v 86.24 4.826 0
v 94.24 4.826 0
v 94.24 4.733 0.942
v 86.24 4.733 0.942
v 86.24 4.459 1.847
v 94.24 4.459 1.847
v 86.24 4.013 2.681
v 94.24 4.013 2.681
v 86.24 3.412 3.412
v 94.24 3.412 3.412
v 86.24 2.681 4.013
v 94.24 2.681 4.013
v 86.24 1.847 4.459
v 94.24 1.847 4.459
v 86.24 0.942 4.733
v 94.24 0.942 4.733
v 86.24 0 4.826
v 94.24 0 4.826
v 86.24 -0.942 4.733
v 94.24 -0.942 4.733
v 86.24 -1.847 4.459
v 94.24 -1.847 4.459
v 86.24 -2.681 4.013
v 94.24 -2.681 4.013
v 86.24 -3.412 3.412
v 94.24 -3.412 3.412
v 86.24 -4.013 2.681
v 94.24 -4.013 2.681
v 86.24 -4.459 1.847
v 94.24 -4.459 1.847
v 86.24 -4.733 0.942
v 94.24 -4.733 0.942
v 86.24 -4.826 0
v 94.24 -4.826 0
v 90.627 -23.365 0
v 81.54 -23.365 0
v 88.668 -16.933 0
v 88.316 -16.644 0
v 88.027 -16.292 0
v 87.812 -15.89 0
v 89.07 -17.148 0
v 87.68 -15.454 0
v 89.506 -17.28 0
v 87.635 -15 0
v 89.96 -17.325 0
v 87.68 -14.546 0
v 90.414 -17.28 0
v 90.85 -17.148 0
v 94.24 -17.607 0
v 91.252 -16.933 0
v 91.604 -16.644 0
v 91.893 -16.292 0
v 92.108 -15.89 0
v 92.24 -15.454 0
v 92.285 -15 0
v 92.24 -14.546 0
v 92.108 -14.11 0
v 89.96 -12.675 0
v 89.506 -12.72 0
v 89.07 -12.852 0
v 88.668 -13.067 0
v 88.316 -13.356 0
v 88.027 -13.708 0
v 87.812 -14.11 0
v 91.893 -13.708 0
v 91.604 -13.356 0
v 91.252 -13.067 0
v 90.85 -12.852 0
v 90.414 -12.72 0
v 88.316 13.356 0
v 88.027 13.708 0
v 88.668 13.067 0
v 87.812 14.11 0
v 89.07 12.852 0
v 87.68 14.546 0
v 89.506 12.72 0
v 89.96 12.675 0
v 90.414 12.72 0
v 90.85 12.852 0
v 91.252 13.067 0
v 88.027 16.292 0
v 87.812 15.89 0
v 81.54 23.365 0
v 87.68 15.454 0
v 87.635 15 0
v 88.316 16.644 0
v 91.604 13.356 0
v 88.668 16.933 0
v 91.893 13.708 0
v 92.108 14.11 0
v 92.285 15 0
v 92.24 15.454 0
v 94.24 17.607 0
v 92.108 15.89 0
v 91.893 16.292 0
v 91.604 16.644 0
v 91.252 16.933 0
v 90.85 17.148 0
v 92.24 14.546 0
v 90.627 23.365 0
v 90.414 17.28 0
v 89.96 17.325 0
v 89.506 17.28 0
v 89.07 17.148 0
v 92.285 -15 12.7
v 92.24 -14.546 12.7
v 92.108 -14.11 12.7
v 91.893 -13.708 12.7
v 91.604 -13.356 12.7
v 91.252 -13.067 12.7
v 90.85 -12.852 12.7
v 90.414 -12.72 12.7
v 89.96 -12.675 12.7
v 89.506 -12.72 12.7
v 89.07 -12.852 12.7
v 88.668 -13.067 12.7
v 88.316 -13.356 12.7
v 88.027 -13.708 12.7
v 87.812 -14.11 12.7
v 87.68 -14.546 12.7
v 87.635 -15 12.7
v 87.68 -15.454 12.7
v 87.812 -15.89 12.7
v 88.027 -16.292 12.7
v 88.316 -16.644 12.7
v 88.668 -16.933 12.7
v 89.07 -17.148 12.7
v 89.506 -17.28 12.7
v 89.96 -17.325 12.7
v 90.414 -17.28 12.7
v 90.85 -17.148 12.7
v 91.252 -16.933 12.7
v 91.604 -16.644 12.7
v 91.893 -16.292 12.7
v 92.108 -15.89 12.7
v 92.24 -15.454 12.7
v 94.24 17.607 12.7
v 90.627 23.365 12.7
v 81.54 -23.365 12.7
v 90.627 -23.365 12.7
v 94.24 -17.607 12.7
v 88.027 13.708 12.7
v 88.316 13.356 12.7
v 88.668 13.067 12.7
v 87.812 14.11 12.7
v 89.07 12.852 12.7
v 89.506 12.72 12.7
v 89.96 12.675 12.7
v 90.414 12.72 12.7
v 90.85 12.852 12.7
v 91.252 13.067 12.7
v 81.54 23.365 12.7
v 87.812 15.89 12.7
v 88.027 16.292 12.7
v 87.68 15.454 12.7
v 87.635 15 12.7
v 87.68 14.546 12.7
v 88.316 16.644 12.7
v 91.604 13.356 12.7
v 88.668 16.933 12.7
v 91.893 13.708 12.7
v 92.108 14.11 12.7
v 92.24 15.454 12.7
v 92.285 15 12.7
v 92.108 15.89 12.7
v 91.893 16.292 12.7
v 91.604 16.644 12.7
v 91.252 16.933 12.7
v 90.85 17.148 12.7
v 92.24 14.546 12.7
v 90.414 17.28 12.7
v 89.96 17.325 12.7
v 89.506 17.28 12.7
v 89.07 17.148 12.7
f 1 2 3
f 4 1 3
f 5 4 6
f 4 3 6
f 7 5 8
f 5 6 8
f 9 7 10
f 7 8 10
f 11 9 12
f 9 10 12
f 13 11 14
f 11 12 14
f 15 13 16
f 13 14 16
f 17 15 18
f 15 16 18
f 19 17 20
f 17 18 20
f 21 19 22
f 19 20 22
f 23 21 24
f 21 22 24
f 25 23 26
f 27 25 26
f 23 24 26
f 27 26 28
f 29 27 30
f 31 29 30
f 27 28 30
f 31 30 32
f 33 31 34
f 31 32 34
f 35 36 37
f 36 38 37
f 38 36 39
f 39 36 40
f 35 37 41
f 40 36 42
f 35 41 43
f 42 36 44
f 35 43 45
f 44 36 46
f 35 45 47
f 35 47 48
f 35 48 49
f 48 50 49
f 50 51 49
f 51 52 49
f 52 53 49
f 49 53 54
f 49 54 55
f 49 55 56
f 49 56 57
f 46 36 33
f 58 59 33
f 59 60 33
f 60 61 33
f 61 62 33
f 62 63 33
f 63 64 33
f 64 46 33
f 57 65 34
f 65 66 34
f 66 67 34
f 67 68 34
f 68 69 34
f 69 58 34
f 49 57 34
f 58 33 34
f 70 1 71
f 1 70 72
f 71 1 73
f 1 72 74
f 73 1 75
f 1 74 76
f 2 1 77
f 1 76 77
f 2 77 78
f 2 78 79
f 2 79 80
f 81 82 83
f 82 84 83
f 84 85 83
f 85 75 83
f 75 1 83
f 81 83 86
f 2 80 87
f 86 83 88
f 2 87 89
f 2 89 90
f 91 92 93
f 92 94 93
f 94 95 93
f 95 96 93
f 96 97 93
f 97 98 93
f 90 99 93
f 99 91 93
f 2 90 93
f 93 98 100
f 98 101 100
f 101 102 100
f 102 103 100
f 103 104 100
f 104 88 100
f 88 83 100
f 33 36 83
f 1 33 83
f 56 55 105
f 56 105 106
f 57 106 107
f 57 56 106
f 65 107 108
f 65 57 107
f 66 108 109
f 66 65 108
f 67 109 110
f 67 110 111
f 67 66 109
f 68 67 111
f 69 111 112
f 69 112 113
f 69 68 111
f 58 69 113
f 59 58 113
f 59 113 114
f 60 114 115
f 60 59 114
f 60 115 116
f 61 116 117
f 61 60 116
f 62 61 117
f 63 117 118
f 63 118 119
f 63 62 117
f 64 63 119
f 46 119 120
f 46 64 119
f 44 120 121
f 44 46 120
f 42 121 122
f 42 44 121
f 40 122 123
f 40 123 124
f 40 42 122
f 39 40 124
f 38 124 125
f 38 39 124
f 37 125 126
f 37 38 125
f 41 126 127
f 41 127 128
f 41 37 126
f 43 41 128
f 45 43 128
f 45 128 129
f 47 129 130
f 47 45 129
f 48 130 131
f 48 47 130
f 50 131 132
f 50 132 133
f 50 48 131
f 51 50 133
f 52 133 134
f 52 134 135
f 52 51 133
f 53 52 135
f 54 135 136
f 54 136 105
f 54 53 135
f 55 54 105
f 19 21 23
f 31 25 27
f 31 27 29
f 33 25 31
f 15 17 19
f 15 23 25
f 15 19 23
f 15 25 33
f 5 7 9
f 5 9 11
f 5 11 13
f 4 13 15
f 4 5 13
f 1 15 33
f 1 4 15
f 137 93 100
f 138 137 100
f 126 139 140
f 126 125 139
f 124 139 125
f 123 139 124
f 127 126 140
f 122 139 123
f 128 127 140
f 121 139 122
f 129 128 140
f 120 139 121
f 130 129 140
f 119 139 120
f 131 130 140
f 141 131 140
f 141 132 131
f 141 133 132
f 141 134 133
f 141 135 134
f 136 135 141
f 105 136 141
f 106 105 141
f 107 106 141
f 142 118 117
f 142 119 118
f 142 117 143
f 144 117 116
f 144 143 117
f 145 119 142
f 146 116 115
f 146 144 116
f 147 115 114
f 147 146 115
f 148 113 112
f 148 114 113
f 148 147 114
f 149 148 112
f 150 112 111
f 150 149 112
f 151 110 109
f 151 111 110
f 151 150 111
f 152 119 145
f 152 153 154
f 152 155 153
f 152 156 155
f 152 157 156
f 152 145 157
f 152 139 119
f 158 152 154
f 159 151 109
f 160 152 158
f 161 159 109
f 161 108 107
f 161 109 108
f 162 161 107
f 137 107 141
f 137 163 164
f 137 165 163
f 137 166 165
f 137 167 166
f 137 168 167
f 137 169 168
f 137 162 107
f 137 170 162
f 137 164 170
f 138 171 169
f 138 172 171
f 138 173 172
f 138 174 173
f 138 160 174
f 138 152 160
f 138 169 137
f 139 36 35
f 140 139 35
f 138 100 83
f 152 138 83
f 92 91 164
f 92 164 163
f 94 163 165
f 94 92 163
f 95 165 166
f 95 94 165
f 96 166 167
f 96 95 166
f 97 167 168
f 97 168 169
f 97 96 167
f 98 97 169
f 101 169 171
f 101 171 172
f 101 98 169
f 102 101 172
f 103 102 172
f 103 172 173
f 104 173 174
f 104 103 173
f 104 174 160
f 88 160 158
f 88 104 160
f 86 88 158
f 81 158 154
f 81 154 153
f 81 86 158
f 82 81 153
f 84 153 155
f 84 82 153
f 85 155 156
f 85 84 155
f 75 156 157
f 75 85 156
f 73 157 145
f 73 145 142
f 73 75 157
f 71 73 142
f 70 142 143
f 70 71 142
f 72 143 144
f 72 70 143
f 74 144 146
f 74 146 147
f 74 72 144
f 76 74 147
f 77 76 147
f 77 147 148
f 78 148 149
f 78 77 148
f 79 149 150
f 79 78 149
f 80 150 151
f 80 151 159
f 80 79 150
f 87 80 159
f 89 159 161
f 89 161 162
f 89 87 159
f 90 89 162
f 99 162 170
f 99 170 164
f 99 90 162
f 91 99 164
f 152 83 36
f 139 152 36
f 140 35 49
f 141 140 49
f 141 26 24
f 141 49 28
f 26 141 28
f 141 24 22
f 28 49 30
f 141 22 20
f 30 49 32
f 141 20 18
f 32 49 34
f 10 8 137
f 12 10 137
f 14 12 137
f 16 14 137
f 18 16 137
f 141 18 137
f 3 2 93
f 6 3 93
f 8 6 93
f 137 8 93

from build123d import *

# Parameters (mm, degrees)
SKETCH1_R           = 2.325
SKETCH1_W           = 7.749999992
SKETCH1_H           = 9.652
BOSS_EXTRUDE1_DEPTH = 12.7
SKETCH2_R           = 4.826
CUT_EXTRUDE1_DEPTH  = 8


with BuildPart() as part:
    # Sketch1 → Boss-Extrude1 (new body)
    # profile 1 of 2: a face of its own
    with BuildSketch(Plane.XY):
        Polygon((90.626647956, 23.365008212), (81.539999992, 23.365008212), (81.539999992, -23.365008212), (90.626647956, -23.365008212), (94.239999992, -17.607359271), (94.239999992, -4.826), (86.49, -4.826), (86.49, 4.826), (94.239999992, 4.826), (94.239999992, 17.607359271), align=None)
        with Locations((89.96, -15)):
            Circle(SKETCH1_R, mode=Mode.SUBTRACT)
        with Locations((89.96, 15)):
            Circle(SKETCH1_R, mode=Mode.SUBTRACT)
    # profile 2 of 2: a face of its own
    with BuildSketch(Plane.XY):
        with Locations((90.364999996, 0)):
            Rectangle(SKETCH1_W, SKETCH1_H)
    extrude(amount=BOSS_EXTRUDE1_DEPTH)

    # Sketch2 → Cut-Extrude1 (cut)
    with BuildSketch(Plane(origin=(94.239999992, 0, 0), x_dir=(0, 0, -1), z_dir=(1, 0, 0))):
        Circle(SKETCH2_R)
    extrude(amount=-CUT_EXTRUDE1_DEPTH, mode=Mode.SUBTRACT)


solid = part.part
